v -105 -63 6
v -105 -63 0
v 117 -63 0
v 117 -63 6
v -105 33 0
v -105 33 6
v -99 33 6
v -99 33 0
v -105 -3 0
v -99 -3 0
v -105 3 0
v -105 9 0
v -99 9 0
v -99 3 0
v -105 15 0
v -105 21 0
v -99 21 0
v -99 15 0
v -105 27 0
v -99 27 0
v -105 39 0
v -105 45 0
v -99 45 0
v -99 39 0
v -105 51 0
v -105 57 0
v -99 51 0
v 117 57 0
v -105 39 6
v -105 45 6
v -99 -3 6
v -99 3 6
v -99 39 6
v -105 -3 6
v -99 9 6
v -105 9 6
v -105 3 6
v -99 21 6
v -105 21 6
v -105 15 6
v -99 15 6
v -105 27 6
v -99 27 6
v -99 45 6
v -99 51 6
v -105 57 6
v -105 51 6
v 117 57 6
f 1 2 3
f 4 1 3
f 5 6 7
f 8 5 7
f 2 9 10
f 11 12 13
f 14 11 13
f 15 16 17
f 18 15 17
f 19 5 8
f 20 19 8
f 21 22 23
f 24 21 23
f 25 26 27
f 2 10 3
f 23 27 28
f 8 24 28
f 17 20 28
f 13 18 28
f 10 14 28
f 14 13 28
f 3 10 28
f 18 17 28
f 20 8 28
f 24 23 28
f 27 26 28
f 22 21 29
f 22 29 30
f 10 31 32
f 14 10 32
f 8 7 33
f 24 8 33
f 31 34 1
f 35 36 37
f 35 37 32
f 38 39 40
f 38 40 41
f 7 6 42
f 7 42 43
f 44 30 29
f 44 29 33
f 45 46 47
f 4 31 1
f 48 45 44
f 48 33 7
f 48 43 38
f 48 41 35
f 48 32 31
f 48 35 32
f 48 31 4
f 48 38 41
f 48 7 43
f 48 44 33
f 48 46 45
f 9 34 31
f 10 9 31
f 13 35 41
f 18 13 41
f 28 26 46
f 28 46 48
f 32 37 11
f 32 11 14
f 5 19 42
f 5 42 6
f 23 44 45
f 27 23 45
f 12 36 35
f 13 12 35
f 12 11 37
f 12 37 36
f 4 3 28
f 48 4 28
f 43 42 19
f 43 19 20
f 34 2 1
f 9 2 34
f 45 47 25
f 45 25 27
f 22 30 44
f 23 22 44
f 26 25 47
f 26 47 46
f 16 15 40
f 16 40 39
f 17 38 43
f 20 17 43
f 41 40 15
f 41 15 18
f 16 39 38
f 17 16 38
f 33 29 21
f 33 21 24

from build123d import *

# Parameters (mm, degrees)
ESBO_O1_W                = 222
ESBO_O1_H                = 120
RESSALTO_EXTRUS_O1_DEPTH = 6
ESBO_O3_W                = 6
ESBO_O3_H                = 6
CORTE_EXTRUS_O1_DEPTH    = 134.018795664
PADR_O_LINEAR2_COUNT     = 5
PADR_O_LINEAR2_PITCH     = 12


with BuildPart() as part:
    # Esboço1 → Ressalto-extrusão1 (new body)
    with BuildSketch(Plane.XY):
        with Locations((6, -3)):
            Rectangle(ESBO_O1_W, ESBO_O1_H)
    extrude(amount=RESSALTO_EXTRUS_O1_DEPTH)

    # Esboço3 → Corte-extrusão1 (cut, through all)
    with BuildSketch(Plane.XY.offset(6)):
        with Locations((-102, 0)):
            Rectangle(ESBO_O3_W, ESBO_O3_H)
    corte_extrus_o1 = extrude(amount=-CORTE_EXTRUS_O1_DEPTH, mode=Mode.SUBTRACT)

    # Padrão linear2: Corte-extrusão1 ×5
    with Locations(*[(0, i * PADR_O_LINEAR2_PITCH, 0) for i in range(1, PADR_O_LINEAR2_COUNT)]):
        add(corte_extrus_o1, mode=Mode.SUBTRACT)


solid = part.part
